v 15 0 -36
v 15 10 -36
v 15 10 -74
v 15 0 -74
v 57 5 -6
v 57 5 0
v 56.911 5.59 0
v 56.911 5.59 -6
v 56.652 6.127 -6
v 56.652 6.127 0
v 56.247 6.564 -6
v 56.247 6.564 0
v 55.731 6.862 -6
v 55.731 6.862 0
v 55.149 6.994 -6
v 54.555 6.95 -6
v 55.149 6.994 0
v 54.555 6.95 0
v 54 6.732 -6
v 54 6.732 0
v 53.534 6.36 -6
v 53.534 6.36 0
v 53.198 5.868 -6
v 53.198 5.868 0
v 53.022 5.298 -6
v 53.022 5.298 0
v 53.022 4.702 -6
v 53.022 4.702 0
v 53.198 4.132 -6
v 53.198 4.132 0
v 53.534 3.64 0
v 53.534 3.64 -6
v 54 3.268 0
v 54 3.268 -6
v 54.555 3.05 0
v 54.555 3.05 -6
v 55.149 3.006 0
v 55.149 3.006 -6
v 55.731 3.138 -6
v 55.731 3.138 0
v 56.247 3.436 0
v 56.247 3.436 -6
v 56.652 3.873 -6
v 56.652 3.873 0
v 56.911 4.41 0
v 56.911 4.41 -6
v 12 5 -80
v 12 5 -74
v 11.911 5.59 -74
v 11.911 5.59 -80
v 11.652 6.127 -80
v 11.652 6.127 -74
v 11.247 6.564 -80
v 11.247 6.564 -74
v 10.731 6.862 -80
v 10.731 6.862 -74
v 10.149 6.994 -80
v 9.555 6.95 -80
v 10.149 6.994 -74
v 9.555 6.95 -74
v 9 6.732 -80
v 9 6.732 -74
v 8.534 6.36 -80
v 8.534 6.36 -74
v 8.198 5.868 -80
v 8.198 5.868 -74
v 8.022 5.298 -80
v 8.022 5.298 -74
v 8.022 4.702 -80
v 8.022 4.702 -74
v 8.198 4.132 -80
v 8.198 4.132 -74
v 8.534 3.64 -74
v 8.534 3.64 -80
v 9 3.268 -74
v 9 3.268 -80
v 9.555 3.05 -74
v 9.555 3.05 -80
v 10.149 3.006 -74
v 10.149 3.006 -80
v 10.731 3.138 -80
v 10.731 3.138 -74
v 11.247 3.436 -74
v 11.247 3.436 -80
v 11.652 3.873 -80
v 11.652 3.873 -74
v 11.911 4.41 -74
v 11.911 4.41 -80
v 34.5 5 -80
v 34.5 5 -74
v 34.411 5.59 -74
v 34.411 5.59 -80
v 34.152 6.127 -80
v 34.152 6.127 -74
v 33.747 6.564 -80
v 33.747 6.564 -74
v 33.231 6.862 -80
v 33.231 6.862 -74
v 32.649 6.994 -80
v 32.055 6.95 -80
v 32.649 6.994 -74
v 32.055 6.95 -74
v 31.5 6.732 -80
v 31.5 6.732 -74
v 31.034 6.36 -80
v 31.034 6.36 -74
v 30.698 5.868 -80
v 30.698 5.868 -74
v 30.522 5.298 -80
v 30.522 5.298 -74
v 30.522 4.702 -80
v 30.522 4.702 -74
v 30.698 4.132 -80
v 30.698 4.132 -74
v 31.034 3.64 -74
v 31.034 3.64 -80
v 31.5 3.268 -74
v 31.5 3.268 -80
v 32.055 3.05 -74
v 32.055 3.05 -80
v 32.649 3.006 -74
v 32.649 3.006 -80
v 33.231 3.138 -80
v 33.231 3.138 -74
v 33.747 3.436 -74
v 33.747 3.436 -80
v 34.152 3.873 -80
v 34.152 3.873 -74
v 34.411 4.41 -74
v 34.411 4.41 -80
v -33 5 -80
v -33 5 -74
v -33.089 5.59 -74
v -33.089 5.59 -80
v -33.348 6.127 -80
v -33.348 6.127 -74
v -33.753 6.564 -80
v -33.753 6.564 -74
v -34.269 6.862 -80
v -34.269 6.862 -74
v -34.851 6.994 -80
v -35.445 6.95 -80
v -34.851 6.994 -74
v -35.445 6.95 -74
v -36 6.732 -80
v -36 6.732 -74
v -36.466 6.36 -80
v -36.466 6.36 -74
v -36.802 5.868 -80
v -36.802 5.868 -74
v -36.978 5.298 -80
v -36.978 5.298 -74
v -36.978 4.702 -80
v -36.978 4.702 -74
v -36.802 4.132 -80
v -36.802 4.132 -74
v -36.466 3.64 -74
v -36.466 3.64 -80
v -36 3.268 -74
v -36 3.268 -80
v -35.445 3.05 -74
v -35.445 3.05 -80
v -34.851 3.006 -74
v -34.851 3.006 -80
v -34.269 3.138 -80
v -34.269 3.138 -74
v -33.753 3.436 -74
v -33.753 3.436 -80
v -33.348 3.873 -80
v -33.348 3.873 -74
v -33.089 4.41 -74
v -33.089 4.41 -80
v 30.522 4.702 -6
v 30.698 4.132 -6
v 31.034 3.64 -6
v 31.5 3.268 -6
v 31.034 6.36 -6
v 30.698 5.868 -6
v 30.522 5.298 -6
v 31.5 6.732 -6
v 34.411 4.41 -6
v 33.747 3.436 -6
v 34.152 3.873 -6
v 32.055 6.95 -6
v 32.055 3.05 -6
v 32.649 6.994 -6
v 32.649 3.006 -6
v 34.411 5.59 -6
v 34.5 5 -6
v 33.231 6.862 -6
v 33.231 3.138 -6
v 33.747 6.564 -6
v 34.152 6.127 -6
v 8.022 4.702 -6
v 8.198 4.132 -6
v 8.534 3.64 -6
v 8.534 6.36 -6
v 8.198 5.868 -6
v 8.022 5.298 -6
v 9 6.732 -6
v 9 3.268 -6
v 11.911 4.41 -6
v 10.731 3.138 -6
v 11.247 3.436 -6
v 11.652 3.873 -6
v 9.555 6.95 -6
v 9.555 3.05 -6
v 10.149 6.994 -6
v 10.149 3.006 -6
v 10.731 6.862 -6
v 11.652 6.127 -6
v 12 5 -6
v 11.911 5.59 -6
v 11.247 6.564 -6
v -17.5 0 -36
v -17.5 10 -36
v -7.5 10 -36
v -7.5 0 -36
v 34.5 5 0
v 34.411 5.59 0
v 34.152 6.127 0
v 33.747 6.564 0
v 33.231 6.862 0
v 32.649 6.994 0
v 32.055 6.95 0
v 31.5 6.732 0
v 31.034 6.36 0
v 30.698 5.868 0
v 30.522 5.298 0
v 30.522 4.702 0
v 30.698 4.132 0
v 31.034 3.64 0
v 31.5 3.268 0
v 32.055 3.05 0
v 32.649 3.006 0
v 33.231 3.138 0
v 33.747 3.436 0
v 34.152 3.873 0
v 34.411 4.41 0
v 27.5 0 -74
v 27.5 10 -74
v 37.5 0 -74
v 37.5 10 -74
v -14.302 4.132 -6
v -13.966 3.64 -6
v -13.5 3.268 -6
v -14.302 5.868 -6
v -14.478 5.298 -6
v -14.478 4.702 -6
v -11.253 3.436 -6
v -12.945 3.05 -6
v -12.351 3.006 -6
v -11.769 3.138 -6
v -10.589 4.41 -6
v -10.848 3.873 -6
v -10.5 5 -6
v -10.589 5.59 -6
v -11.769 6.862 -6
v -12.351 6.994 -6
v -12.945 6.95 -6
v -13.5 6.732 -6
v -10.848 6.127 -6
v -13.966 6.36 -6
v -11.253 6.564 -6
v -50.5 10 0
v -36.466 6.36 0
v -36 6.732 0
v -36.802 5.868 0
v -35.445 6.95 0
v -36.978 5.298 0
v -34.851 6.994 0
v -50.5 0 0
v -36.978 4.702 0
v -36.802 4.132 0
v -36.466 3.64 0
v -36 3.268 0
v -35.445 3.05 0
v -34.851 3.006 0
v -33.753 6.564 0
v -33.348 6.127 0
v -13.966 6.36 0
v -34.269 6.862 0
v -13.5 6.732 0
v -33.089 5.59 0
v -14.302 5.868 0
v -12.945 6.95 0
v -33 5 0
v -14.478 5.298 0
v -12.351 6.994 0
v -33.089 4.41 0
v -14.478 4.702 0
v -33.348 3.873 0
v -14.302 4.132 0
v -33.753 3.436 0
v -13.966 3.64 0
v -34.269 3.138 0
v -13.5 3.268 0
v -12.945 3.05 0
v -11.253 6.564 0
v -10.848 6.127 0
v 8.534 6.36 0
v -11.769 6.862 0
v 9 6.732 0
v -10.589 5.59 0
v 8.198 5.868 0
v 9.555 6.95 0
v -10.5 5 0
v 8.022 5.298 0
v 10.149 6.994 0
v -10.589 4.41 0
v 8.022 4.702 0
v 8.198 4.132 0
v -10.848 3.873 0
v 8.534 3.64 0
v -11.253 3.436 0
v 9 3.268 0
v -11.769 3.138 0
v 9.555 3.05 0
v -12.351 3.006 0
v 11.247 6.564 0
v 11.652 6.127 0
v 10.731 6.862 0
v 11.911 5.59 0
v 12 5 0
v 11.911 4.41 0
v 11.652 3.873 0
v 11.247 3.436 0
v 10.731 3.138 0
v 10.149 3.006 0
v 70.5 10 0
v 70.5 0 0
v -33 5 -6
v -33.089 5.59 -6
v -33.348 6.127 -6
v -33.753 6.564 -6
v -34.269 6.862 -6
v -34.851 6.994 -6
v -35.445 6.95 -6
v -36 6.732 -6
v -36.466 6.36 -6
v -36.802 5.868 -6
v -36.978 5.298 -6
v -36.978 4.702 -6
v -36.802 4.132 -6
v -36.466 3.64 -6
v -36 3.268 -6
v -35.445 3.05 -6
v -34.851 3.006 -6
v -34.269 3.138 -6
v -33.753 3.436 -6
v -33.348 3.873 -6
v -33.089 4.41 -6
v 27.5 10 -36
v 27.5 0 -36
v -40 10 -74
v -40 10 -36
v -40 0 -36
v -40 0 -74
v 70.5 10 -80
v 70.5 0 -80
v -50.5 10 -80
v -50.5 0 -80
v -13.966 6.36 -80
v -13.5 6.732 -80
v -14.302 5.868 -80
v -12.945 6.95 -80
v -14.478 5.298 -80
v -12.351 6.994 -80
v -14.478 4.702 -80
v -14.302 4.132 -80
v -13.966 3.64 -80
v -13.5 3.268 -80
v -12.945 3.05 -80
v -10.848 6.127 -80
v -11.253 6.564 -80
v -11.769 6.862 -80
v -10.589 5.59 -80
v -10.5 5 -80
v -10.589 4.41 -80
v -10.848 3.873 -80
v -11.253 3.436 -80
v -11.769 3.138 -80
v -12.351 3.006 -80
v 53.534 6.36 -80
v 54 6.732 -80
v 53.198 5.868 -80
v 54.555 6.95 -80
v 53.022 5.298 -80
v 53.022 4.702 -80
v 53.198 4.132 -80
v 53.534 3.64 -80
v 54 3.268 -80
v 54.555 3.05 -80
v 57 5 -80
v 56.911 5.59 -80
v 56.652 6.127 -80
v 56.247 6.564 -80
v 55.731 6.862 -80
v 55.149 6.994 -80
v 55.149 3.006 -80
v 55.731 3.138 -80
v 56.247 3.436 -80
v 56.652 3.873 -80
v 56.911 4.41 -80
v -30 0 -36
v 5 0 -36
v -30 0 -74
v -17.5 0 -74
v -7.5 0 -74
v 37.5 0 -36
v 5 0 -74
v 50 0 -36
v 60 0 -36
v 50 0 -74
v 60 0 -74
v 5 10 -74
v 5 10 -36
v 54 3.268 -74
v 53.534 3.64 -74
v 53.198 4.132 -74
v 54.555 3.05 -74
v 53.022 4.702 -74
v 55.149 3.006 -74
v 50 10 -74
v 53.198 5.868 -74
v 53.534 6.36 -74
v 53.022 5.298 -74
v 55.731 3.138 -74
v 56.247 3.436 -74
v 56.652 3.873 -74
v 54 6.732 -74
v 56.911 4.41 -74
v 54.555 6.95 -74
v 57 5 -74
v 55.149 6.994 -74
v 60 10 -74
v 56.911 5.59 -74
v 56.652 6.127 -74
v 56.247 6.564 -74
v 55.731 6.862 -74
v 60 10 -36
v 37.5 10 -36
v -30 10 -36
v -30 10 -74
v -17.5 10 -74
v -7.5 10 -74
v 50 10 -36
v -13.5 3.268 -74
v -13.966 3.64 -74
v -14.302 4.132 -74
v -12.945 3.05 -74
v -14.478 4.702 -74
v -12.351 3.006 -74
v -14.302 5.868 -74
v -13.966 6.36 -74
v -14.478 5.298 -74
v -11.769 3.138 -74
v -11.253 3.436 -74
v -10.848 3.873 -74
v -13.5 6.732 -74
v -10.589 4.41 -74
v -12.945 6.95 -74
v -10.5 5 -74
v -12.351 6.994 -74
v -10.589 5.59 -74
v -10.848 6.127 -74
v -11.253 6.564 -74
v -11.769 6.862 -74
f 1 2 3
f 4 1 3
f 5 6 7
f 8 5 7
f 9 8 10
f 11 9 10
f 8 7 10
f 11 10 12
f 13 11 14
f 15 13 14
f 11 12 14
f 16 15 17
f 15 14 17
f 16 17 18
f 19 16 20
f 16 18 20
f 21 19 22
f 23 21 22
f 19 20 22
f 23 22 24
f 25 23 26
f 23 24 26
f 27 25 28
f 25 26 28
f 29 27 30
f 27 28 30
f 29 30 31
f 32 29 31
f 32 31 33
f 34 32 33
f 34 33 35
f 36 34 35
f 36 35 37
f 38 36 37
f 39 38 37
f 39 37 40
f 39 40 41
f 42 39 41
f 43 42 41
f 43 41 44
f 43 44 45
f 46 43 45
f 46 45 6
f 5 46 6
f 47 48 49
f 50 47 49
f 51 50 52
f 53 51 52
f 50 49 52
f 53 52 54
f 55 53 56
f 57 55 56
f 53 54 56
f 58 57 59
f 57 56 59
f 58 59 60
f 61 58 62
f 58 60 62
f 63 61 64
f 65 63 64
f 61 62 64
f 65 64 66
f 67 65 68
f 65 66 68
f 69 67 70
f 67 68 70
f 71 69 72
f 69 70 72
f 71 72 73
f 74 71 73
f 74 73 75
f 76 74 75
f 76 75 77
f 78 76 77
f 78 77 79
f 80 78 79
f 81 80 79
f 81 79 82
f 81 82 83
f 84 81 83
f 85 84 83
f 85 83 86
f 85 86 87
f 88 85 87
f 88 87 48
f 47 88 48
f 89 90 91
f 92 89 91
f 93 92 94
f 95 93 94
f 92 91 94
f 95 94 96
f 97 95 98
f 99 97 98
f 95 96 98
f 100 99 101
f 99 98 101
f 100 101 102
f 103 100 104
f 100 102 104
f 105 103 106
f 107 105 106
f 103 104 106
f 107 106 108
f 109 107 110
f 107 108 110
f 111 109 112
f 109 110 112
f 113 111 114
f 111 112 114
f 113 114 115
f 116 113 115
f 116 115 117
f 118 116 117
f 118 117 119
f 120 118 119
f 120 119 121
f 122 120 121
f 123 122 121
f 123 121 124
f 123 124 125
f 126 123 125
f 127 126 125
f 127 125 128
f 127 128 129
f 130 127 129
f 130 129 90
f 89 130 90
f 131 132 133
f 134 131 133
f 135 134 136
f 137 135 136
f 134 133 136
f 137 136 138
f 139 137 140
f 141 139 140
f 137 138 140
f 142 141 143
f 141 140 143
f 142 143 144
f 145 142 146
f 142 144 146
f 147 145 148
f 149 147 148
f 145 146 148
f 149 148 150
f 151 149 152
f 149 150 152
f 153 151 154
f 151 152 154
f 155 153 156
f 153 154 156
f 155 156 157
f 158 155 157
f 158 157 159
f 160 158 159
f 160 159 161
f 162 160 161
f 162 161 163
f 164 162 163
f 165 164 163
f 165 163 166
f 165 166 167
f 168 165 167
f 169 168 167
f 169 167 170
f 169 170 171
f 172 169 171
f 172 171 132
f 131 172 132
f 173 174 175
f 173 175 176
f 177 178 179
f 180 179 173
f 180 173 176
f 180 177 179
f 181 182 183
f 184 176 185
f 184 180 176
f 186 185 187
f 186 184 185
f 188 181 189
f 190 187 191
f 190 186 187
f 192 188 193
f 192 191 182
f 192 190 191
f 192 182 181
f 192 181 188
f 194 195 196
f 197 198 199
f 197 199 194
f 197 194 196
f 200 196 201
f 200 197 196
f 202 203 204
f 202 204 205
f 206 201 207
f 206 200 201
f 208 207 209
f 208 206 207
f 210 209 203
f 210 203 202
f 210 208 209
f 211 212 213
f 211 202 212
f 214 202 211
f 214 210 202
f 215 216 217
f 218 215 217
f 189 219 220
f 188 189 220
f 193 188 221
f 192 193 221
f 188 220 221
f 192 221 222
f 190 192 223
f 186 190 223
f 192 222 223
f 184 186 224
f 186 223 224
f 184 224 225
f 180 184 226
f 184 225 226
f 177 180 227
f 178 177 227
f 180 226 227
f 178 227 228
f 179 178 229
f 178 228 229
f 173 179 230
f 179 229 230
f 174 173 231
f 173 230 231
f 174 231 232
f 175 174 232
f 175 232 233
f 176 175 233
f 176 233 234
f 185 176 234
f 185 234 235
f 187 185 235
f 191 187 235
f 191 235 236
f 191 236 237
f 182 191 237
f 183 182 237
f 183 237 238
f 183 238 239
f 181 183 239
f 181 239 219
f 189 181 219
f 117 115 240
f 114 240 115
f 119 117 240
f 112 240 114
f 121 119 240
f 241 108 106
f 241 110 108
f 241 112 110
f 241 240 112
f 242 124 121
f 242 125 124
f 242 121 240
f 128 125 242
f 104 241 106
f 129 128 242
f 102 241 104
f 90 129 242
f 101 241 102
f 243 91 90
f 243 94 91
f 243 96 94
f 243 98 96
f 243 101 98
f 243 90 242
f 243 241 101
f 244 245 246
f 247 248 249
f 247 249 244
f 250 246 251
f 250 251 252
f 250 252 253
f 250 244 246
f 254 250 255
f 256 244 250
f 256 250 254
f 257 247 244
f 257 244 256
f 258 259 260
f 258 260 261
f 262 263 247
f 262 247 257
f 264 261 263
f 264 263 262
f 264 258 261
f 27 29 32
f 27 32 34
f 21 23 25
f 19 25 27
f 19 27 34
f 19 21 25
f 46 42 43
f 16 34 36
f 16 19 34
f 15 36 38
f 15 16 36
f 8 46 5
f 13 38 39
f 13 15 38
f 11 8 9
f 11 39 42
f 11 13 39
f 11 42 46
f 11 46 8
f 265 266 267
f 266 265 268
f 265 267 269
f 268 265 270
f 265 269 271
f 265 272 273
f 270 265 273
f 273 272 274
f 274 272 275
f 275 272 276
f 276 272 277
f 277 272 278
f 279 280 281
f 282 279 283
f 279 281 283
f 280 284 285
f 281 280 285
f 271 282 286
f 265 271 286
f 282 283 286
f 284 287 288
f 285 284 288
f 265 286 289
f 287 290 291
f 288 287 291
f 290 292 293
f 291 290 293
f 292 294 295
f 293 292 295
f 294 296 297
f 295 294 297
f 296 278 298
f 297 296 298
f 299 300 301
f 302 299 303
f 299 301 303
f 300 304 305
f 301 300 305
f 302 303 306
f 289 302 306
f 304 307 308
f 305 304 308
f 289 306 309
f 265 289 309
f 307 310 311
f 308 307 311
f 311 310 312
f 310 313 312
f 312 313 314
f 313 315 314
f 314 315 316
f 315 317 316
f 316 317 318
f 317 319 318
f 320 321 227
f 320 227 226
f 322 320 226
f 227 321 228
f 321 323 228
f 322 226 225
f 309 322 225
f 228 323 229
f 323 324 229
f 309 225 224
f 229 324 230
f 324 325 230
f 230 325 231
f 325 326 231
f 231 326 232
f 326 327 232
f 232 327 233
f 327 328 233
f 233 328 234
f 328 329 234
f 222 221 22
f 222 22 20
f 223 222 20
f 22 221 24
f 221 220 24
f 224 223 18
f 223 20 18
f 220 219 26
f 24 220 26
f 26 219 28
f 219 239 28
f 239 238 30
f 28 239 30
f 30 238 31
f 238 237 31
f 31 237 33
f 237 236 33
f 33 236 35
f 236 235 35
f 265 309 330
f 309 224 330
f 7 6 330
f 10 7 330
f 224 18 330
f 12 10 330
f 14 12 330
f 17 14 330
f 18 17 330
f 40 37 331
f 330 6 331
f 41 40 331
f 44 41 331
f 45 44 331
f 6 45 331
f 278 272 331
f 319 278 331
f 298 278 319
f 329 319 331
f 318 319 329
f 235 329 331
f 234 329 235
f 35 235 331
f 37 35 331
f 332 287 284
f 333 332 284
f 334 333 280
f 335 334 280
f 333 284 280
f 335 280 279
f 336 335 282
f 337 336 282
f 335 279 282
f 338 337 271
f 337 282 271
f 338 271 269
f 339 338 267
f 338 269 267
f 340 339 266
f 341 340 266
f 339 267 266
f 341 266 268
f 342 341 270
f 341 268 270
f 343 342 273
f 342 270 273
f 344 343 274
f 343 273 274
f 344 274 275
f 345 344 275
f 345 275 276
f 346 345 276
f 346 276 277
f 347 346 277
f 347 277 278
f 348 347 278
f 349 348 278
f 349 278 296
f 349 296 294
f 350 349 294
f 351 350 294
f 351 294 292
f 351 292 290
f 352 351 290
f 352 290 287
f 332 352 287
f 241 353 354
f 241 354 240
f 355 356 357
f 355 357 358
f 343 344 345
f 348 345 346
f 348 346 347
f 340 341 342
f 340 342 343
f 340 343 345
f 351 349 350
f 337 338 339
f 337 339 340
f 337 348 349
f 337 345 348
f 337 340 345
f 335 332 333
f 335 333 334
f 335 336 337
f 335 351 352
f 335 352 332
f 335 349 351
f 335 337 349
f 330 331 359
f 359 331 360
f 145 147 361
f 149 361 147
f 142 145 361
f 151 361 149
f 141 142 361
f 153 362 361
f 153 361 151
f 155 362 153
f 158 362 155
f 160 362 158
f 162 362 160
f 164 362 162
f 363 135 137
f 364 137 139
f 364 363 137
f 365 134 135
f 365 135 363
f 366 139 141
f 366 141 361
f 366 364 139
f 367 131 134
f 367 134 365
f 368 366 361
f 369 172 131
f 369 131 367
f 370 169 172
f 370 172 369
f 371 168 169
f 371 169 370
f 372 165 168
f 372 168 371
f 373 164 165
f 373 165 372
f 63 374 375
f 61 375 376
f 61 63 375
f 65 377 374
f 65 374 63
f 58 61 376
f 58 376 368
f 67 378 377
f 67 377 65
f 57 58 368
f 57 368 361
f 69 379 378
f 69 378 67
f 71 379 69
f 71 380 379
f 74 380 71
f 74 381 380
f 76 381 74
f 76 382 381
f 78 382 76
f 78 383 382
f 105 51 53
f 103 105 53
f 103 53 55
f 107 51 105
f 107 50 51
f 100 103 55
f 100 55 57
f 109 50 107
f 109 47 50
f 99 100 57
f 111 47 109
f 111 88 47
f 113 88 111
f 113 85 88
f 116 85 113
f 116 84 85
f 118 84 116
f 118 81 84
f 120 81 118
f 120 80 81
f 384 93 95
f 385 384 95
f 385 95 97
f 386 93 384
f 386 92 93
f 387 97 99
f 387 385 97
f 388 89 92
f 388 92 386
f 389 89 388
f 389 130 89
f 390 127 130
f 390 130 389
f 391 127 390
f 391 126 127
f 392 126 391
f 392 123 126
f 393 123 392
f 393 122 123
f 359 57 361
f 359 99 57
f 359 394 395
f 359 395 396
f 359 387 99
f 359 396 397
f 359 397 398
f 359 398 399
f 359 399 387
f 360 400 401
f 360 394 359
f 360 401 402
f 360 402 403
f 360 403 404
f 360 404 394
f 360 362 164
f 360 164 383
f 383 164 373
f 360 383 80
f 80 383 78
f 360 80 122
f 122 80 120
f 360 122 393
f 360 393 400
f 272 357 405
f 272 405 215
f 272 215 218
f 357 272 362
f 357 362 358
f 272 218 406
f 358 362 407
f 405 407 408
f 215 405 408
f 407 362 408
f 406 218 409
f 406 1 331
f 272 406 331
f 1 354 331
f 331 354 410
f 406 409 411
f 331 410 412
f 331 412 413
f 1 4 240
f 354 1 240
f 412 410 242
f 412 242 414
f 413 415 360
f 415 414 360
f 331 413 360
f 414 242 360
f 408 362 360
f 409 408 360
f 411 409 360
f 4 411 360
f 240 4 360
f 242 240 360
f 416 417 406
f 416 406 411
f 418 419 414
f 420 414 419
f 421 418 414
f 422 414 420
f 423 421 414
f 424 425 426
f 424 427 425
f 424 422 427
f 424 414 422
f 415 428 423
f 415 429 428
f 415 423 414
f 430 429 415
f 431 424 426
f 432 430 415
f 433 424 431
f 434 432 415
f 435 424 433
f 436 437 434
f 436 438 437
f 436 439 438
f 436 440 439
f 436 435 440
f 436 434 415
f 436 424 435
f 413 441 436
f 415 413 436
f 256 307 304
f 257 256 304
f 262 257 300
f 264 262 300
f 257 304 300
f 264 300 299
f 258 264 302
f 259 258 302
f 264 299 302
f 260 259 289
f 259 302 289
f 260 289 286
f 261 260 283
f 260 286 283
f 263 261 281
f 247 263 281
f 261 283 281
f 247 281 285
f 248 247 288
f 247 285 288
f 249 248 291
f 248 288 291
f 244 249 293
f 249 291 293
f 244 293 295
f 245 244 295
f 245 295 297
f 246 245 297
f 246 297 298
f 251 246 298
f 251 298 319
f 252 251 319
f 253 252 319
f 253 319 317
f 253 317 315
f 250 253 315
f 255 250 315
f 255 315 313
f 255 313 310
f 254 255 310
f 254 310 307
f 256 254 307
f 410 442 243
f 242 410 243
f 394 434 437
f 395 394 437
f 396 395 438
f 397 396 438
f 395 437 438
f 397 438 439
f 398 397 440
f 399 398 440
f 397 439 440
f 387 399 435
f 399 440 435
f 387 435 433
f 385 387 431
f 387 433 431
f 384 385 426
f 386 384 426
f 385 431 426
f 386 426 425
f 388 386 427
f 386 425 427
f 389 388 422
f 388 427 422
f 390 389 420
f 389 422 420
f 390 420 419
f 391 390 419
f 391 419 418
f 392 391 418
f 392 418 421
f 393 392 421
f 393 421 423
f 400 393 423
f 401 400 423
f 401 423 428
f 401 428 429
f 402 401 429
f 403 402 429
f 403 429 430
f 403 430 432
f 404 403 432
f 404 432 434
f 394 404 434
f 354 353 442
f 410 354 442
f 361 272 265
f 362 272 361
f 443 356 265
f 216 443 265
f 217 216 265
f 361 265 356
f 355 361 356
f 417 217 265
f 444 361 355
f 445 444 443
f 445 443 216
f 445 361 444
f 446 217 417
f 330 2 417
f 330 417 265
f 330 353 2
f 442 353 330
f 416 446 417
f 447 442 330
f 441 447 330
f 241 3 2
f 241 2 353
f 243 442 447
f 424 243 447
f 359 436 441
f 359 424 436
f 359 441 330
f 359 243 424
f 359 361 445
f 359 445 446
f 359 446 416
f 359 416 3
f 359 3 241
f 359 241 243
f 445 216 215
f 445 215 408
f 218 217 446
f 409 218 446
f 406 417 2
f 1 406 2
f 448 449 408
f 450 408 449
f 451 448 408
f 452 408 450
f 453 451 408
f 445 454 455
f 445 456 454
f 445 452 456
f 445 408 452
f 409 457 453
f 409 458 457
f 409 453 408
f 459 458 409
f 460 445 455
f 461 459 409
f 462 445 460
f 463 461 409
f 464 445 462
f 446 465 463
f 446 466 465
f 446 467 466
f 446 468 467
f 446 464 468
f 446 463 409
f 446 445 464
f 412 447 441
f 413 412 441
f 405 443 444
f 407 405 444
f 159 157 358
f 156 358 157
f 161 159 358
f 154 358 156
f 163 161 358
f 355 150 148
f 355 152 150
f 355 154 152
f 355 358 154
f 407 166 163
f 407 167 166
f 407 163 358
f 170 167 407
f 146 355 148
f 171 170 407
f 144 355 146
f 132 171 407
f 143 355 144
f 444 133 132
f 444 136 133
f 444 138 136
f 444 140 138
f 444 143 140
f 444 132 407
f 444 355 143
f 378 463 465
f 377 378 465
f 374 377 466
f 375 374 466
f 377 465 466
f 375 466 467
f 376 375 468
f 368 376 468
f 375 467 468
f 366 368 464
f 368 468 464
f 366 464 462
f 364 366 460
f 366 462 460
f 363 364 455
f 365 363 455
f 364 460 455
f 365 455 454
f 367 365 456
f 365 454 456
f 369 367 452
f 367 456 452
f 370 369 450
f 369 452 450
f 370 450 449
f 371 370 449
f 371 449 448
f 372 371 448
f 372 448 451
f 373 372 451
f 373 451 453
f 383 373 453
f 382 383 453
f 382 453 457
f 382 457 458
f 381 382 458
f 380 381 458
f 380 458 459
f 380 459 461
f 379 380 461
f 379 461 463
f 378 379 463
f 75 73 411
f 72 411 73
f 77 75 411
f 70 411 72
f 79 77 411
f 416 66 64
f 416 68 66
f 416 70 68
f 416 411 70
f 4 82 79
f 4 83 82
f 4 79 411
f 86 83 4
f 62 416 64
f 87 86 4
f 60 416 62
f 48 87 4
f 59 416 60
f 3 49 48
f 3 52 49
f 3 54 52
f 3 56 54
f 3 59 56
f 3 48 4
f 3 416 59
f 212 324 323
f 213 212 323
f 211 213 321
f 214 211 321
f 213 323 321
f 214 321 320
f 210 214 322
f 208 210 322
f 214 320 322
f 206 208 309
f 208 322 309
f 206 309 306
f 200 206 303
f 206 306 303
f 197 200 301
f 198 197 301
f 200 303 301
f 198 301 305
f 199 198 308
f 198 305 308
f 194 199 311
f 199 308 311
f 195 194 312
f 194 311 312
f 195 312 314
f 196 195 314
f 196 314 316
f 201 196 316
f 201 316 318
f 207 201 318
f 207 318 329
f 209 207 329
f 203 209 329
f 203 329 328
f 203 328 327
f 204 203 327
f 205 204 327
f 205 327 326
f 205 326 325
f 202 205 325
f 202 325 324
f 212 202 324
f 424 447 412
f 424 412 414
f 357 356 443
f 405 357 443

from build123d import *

# Parameters (mm, degrees)
SKETCH1_W           = 121
SKETCH1_H           = 80
BOSS_EXTRUDE1_DEPTH = 10
SKETCH2_W           = 10
SKETCH2_H           = 68
CUT_EXTRUDE1_DEPTH  = 10
SKETCH7_R           = 2
CUT_EXTRUDE4_DEPTH  = 108.099253032
SKETCH8_W           = 100
SKETCH8_H           = 30
BOSS_EXTRUDE4_DEPTH = 10


with BuildPart() as part:
    # Sketch1 → Boss-Extrude1 (new body)
    with BuildSketch(Plane(origin=(0, 0, 0), x_dir=(1, 0, 0), z_dir=(0, 1, 0))):
        with Locations((10, 40)):
            Rectangle(SKETCH1_W, SKETCH1_H)
    extrude(amount=BOSS_EXTRUDE1_DEPTH)

    # Sketch2 → Cut-Extrude1 (cut)
    with BuildSketch(Plane(origin=(0, 10, 0), x_dir=(1, 0, 0), z_dir=(0, 1, 0))):
        with Locations((-35, 40)):
            Rectangle(SKETCH2_W, SKETCH2_H)
        with Locations((-12.5, 40)):
            Rectangle(SKETCH2_W, SKETCH2_H)
        with Locations((10, 40)):
            Rectangle(SKETCH2_W, SKETCH2_H)
        with Locations((32.5, 40)):
            Rectangle(SKETCH2_W, SKETCH2_H)
        with Locations((55, 40)):
            Rectangle(SKETCH2_W, SKETCH2_H)
    extrude(amount=-CUT_EXTRUDE1_DEPTH, mode=Mode.SUBTRACT)

    # Sketch7 → Cut-Extrude4 (cut, through all)
    with BuildSketch(Plane.XY):
        with Locations((-35, 5)):
            Circle(SKETCH7_R)
        with Locations((-12.5, 5)):
            Circle(SKETCH7_R)
        with Locations((10, 5)):
            Circle(SKETCH7_R)
        with Locations((32.5, 5)):
            Circle(SKETCH7_R)
        with Locations((55, 5)):
            Circle(SKETCH7_R)
    extrude(amount=-CUT_EXTRUDE4_DEPTH, mode=Mode.SUBTRACT)

    # Sketch8 → Boss-Extrude4 (add)
    with BuildSketch(Plane(origin=(0, 10, 0), x_dir=(1, 0, 0), z_dir=(0, 1, 0))):
        with Locations((10, 21)):
            Rectangle(SKETCH8_W, SKETCH8_H)
    extrude(amount=-BOSS_EXTRUDE4_DEPTH)


solid = part.part
